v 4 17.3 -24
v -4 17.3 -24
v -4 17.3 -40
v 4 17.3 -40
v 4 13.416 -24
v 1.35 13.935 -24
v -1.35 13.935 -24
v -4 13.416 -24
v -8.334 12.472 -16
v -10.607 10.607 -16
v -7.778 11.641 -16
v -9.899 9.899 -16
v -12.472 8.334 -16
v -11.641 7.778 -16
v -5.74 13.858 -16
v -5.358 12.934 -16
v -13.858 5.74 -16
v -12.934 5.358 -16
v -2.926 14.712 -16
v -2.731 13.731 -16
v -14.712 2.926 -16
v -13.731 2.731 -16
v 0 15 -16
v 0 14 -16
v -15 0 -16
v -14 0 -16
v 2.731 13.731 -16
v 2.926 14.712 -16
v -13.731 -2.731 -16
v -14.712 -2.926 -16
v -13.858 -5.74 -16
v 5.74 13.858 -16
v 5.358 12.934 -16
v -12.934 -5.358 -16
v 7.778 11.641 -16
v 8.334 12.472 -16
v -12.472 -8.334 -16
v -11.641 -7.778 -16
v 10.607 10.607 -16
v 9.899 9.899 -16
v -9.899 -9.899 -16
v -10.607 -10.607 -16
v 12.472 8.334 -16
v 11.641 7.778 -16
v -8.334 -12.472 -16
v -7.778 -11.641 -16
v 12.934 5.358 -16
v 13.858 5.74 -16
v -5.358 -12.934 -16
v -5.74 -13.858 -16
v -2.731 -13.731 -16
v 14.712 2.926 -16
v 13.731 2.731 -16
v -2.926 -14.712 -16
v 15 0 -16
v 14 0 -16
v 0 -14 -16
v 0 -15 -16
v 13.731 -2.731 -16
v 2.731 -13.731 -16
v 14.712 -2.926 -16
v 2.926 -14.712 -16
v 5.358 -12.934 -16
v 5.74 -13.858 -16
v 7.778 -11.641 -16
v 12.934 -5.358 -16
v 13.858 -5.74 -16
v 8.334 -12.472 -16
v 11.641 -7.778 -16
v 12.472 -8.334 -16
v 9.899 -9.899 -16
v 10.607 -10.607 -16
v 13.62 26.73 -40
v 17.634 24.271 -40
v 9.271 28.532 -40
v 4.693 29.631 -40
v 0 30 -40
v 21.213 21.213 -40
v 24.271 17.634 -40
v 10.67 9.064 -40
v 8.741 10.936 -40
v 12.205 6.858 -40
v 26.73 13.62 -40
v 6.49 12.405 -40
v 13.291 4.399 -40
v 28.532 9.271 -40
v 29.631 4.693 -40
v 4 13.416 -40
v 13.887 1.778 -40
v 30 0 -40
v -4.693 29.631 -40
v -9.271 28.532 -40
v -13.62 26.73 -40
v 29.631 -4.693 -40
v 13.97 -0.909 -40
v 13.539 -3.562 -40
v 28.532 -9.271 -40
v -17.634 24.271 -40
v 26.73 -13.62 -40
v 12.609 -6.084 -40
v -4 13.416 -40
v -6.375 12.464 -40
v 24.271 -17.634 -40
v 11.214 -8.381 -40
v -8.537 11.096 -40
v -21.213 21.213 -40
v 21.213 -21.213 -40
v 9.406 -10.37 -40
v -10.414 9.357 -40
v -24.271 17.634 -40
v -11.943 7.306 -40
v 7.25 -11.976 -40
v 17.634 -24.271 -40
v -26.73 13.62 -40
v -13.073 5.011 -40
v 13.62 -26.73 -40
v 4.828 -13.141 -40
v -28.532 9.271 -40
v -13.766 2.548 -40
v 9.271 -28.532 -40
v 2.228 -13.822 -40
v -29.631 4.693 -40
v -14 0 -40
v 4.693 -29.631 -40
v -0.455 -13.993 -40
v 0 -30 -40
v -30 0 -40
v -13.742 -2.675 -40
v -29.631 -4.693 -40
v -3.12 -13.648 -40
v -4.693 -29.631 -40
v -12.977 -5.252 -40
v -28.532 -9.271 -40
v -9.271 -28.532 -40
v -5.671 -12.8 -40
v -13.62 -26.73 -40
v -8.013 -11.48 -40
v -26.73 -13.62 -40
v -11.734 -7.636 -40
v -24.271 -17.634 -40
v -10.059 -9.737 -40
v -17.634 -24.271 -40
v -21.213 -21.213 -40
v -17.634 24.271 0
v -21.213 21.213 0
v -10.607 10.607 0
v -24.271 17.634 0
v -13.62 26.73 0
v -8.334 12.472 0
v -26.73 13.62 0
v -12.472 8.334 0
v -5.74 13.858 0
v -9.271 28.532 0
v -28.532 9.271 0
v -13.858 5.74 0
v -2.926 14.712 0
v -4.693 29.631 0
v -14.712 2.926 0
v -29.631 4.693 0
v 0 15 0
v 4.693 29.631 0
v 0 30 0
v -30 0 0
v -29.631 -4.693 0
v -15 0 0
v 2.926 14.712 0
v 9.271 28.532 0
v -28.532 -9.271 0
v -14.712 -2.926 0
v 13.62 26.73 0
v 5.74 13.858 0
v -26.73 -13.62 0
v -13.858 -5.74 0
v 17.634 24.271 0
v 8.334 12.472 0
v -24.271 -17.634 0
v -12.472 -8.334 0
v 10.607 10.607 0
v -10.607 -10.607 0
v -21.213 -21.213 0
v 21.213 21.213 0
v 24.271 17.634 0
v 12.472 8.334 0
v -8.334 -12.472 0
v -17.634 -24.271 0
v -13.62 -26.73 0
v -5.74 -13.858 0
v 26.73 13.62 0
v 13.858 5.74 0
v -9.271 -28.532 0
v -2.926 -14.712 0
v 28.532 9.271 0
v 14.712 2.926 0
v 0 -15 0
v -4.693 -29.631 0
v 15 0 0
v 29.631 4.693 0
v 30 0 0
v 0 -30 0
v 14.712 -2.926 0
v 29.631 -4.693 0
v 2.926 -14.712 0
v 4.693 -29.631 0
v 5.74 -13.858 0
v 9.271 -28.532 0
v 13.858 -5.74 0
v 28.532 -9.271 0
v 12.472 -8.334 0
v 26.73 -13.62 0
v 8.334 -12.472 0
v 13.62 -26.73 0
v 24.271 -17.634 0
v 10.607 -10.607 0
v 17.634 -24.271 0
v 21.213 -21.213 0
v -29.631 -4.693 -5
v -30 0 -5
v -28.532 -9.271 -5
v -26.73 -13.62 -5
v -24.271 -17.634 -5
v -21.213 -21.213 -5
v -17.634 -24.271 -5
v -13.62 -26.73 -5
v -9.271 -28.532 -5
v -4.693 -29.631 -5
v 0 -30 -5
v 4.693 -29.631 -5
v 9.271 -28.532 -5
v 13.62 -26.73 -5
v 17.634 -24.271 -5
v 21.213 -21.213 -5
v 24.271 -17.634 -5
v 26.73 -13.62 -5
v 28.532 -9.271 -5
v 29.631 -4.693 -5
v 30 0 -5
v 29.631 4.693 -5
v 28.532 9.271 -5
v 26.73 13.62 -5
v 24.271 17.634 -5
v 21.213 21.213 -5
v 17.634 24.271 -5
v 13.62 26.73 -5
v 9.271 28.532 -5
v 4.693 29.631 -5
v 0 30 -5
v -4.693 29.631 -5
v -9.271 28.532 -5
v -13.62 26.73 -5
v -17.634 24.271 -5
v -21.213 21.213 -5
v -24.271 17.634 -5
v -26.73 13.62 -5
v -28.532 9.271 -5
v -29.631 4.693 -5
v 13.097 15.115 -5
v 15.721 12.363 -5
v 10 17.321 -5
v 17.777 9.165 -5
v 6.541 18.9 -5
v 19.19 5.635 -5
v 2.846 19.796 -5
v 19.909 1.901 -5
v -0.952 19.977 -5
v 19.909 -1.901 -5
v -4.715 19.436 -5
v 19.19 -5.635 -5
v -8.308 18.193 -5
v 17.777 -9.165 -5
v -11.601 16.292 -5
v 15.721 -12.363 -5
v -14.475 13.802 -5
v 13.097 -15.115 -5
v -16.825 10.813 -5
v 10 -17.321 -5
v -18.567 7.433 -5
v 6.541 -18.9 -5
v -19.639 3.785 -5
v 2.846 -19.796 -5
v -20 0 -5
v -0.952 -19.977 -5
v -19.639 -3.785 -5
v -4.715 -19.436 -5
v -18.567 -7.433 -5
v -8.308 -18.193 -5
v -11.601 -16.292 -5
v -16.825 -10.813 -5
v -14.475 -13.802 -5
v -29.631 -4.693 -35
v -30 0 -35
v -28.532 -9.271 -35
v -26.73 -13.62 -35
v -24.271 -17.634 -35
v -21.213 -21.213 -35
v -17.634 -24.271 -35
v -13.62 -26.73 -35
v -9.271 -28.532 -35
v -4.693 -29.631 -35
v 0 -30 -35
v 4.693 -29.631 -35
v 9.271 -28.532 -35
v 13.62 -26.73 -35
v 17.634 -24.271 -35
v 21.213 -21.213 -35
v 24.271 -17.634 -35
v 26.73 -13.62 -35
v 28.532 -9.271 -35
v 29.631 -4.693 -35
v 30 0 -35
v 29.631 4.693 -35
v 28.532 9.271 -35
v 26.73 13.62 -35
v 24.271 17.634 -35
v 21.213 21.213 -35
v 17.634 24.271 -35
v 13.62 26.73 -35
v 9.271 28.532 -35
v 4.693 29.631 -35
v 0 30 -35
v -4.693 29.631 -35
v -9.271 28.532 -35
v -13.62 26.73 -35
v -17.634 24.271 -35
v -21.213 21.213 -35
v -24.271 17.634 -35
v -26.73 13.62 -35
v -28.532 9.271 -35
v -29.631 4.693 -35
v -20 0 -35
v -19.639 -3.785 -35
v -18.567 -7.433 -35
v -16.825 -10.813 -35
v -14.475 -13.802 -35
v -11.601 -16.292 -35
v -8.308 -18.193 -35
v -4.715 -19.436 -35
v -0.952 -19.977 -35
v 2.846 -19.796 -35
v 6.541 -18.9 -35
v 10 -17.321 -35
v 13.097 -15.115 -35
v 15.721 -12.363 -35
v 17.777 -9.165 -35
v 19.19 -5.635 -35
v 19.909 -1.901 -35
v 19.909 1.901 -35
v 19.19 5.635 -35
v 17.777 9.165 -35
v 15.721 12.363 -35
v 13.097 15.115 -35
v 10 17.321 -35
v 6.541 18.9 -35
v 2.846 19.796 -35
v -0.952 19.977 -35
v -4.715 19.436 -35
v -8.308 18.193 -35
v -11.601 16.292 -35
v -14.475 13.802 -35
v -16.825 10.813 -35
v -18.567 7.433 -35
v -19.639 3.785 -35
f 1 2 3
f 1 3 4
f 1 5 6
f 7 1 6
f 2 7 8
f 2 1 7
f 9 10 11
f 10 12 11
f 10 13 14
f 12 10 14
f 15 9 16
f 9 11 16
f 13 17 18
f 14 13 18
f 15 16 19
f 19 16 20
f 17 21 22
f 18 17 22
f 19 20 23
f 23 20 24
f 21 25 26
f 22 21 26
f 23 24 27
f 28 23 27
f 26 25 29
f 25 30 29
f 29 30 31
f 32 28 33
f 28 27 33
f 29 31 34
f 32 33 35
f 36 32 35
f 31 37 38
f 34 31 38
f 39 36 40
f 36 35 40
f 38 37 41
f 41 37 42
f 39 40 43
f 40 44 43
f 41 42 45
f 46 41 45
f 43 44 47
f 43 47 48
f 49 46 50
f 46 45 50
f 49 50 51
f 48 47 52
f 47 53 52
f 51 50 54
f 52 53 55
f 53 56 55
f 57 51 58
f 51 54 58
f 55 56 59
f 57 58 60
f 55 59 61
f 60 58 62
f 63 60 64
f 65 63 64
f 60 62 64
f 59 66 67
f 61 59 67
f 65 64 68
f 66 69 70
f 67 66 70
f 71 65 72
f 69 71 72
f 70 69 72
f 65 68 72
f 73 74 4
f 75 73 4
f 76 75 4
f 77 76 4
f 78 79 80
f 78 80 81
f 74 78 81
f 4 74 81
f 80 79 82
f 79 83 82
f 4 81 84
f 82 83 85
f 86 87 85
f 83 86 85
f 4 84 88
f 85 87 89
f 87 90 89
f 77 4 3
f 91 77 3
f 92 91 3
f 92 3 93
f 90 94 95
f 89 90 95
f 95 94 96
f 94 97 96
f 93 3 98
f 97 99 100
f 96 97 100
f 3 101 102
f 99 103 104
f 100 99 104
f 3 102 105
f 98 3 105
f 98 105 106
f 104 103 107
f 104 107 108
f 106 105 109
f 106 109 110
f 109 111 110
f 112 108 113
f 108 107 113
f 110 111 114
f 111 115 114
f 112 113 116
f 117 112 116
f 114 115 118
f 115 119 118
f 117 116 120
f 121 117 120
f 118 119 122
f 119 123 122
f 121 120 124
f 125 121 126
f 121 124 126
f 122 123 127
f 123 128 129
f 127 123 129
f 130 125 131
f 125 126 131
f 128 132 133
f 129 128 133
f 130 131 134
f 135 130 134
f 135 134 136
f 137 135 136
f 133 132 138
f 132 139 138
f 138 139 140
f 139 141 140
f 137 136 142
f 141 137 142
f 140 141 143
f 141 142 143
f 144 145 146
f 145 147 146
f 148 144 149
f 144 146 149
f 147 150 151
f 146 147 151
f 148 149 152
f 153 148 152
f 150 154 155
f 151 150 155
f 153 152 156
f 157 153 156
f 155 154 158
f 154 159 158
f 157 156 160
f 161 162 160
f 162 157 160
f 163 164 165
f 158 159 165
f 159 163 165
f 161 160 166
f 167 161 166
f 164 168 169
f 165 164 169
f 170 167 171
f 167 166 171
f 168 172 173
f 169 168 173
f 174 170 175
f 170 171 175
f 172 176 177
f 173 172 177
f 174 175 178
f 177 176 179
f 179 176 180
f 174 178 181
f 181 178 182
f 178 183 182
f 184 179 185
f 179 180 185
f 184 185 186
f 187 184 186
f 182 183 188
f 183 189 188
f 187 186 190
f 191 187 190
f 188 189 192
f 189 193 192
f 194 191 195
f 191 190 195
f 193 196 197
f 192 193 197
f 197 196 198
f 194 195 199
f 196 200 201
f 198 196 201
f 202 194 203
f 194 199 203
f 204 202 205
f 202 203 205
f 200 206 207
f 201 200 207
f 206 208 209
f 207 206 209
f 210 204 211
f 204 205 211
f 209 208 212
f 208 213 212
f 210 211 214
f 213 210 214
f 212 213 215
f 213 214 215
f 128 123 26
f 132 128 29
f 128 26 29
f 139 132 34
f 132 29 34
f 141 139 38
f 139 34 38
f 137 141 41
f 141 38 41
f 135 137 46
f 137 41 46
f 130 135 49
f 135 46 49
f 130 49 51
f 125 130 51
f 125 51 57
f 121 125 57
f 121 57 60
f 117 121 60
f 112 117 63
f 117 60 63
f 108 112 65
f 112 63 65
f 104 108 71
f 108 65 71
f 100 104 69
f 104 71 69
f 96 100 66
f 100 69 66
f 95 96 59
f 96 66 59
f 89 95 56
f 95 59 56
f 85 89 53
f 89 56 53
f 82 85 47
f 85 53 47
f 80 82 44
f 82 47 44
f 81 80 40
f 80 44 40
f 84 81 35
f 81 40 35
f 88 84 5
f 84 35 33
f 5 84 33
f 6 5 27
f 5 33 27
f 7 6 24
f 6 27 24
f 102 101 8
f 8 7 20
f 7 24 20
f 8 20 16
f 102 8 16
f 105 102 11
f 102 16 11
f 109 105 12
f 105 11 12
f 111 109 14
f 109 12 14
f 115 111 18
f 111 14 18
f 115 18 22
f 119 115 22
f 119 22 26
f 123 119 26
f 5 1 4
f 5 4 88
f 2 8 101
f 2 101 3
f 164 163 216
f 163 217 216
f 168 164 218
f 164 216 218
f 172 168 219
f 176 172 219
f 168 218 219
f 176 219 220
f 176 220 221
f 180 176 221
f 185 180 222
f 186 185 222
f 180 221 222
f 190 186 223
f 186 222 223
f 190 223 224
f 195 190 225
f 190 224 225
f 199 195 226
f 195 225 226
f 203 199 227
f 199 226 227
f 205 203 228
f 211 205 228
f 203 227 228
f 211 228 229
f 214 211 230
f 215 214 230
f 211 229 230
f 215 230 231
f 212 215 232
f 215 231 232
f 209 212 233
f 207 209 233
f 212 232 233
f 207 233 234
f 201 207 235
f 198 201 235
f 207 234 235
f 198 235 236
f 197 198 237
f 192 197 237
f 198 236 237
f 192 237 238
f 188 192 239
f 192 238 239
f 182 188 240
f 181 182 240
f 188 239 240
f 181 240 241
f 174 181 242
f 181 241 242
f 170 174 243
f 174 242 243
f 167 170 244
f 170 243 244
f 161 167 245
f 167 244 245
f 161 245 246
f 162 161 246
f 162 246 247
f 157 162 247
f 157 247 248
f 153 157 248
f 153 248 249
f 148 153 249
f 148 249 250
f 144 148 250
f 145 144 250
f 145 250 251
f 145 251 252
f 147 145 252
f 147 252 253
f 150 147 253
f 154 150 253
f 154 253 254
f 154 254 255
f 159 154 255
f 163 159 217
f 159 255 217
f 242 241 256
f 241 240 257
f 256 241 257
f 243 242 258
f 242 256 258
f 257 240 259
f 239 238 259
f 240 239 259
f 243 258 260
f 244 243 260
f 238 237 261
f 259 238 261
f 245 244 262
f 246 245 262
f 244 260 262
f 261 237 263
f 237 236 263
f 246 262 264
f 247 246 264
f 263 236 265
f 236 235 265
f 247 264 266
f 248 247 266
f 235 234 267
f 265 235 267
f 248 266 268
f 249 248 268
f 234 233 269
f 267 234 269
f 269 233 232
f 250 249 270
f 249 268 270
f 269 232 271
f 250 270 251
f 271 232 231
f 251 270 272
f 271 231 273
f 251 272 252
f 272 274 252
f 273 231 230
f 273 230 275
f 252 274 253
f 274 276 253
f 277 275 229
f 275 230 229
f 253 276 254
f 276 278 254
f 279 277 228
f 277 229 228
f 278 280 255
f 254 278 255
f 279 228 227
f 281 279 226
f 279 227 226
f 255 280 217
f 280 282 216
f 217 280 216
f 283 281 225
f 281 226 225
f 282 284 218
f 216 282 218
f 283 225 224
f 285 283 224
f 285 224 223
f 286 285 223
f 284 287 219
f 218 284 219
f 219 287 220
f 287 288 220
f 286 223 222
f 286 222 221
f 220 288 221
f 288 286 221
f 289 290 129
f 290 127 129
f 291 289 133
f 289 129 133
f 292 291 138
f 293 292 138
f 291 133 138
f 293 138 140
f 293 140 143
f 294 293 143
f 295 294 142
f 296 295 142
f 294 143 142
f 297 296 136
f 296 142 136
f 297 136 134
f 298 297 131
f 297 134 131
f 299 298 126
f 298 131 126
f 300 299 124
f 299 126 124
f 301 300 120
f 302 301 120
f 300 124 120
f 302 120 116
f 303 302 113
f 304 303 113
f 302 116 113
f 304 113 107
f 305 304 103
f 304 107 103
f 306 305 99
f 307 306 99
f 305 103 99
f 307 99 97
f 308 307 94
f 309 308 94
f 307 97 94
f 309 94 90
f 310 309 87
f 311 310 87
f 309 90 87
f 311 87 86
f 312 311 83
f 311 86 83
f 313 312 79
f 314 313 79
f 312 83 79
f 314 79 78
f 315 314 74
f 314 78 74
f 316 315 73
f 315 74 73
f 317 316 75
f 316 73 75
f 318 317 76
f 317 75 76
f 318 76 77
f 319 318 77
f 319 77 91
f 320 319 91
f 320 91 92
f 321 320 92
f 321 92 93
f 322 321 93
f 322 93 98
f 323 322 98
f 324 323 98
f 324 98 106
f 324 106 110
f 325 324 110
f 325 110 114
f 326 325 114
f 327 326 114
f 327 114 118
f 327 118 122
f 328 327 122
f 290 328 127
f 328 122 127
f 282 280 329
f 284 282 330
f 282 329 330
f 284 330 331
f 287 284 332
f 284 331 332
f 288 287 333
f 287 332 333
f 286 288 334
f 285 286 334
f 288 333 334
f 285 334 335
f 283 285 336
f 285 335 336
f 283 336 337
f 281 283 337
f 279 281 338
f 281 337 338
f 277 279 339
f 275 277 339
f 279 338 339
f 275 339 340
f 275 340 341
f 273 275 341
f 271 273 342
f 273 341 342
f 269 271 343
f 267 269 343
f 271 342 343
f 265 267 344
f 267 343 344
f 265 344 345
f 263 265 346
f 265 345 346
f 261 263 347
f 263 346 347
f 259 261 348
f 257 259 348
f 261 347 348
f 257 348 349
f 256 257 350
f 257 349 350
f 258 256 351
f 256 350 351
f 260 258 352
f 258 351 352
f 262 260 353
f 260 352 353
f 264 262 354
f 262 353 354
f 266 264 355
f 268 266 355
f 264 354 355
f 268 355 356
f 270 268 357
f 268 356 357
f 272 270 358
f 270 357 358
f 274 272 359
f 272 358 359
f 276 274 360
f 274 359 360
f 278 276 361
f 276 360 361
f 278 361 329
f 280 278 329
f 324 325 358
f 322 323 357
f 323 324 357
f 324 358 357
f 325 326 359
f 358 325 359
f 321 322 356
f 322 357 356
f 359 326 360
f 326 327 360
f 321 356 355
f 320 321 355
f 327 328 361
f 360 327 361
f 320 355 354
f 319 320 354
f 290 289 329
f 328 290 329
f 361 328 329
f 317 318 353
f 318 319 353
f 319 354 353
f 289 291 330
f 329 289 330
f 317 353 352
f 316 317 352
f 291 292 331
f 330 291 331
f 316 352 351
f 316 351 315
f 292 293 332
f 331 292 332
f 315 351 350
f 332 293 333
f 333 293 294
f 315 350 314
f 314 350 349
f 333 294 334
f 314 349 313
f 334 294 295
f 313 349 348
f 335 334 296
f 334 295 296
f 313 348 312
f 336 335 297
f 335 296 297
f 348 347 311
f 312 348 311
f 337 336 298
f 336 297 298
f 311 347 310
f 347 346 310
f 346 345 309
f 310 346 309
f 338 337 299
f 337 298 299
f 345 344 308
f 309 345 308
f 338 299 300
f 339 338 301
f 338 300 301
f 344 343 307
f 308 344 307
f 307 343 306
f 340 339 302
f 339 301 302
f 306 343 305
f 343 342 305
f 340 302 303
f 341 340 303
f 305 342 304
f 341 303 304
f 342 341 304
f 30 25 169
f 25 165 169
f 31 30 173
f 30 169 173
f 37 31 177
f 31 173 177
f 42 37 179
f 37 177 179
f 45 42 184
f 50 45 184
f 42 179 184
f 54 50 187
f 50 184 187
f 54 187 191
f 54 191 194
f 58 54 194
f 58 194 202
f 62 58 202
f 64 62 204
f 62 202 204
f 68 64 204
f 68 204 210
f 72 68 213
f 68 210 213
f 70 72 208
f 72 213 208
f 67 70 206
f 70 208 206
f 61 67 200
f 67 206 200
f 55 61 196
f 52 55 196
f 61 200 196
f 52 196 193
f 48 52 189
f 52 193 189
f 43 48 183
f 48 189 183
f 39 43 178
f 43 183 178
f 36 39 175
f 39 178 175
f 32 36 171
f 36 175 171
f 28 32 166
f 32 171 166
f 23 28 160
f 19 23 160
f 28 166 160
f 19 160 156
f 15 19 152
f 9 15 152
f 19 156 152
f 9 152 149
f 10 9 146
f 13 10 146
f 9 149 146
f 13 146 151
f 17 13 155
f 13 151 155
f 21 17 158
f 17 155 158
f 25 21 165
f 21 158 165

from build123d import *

# Parameters (mm, degrees)
CUT_EXTRUDE1_START = -16
CUT_EXTRUDE1_DEPTH = 16


with BuildPart() as part:
    # Sketch1 → Revolve1 (revolve)
    with BuildSketch(Plane(origin=(0, 0, 0), x_dir=(1, 0, 0), z_dir=(0, 1, 0)), mode=Mode.PRIVATE) as revolve1_sk:
        Polygon((15, 0), (30, 0), (30, 5), (20, 5), (20, 35), (30, 35), (30, 40), (14, 40), (14, 16), (15, 16), align=None)
    revolve(revolve1_sk.sketch.rotate(Axis((0, 0, -89.857142857), (0, 0, 1)), 180), axis=Axis((0, 0, -89.857142857), (0, 0, 1)))

    # Sketch2 → Cut-Extrude1 (cut)
    with BuildSketch(Plane(origin=(0, 0, -40), x_dir=(-1, 0, 0), z_dir=(0, 0, -1)).offset(CUT_EXTRUDE1_START)):
        with BuildLine():
            Line((4, 17.3), (-4, 17.3))
            Line((-4, 17.3), (-4, 13.416407865))
            ThreePointArc((-4, 13.416407865), (0, 14), (4, 13.416407865))
            Line((4, 13.416407865), (4, 17.3))
        make_face()
    extrude(amount=CUT_EXTRUDE1_DEPTH, mode=Mode.SUBTRACT)


solid = part.part
